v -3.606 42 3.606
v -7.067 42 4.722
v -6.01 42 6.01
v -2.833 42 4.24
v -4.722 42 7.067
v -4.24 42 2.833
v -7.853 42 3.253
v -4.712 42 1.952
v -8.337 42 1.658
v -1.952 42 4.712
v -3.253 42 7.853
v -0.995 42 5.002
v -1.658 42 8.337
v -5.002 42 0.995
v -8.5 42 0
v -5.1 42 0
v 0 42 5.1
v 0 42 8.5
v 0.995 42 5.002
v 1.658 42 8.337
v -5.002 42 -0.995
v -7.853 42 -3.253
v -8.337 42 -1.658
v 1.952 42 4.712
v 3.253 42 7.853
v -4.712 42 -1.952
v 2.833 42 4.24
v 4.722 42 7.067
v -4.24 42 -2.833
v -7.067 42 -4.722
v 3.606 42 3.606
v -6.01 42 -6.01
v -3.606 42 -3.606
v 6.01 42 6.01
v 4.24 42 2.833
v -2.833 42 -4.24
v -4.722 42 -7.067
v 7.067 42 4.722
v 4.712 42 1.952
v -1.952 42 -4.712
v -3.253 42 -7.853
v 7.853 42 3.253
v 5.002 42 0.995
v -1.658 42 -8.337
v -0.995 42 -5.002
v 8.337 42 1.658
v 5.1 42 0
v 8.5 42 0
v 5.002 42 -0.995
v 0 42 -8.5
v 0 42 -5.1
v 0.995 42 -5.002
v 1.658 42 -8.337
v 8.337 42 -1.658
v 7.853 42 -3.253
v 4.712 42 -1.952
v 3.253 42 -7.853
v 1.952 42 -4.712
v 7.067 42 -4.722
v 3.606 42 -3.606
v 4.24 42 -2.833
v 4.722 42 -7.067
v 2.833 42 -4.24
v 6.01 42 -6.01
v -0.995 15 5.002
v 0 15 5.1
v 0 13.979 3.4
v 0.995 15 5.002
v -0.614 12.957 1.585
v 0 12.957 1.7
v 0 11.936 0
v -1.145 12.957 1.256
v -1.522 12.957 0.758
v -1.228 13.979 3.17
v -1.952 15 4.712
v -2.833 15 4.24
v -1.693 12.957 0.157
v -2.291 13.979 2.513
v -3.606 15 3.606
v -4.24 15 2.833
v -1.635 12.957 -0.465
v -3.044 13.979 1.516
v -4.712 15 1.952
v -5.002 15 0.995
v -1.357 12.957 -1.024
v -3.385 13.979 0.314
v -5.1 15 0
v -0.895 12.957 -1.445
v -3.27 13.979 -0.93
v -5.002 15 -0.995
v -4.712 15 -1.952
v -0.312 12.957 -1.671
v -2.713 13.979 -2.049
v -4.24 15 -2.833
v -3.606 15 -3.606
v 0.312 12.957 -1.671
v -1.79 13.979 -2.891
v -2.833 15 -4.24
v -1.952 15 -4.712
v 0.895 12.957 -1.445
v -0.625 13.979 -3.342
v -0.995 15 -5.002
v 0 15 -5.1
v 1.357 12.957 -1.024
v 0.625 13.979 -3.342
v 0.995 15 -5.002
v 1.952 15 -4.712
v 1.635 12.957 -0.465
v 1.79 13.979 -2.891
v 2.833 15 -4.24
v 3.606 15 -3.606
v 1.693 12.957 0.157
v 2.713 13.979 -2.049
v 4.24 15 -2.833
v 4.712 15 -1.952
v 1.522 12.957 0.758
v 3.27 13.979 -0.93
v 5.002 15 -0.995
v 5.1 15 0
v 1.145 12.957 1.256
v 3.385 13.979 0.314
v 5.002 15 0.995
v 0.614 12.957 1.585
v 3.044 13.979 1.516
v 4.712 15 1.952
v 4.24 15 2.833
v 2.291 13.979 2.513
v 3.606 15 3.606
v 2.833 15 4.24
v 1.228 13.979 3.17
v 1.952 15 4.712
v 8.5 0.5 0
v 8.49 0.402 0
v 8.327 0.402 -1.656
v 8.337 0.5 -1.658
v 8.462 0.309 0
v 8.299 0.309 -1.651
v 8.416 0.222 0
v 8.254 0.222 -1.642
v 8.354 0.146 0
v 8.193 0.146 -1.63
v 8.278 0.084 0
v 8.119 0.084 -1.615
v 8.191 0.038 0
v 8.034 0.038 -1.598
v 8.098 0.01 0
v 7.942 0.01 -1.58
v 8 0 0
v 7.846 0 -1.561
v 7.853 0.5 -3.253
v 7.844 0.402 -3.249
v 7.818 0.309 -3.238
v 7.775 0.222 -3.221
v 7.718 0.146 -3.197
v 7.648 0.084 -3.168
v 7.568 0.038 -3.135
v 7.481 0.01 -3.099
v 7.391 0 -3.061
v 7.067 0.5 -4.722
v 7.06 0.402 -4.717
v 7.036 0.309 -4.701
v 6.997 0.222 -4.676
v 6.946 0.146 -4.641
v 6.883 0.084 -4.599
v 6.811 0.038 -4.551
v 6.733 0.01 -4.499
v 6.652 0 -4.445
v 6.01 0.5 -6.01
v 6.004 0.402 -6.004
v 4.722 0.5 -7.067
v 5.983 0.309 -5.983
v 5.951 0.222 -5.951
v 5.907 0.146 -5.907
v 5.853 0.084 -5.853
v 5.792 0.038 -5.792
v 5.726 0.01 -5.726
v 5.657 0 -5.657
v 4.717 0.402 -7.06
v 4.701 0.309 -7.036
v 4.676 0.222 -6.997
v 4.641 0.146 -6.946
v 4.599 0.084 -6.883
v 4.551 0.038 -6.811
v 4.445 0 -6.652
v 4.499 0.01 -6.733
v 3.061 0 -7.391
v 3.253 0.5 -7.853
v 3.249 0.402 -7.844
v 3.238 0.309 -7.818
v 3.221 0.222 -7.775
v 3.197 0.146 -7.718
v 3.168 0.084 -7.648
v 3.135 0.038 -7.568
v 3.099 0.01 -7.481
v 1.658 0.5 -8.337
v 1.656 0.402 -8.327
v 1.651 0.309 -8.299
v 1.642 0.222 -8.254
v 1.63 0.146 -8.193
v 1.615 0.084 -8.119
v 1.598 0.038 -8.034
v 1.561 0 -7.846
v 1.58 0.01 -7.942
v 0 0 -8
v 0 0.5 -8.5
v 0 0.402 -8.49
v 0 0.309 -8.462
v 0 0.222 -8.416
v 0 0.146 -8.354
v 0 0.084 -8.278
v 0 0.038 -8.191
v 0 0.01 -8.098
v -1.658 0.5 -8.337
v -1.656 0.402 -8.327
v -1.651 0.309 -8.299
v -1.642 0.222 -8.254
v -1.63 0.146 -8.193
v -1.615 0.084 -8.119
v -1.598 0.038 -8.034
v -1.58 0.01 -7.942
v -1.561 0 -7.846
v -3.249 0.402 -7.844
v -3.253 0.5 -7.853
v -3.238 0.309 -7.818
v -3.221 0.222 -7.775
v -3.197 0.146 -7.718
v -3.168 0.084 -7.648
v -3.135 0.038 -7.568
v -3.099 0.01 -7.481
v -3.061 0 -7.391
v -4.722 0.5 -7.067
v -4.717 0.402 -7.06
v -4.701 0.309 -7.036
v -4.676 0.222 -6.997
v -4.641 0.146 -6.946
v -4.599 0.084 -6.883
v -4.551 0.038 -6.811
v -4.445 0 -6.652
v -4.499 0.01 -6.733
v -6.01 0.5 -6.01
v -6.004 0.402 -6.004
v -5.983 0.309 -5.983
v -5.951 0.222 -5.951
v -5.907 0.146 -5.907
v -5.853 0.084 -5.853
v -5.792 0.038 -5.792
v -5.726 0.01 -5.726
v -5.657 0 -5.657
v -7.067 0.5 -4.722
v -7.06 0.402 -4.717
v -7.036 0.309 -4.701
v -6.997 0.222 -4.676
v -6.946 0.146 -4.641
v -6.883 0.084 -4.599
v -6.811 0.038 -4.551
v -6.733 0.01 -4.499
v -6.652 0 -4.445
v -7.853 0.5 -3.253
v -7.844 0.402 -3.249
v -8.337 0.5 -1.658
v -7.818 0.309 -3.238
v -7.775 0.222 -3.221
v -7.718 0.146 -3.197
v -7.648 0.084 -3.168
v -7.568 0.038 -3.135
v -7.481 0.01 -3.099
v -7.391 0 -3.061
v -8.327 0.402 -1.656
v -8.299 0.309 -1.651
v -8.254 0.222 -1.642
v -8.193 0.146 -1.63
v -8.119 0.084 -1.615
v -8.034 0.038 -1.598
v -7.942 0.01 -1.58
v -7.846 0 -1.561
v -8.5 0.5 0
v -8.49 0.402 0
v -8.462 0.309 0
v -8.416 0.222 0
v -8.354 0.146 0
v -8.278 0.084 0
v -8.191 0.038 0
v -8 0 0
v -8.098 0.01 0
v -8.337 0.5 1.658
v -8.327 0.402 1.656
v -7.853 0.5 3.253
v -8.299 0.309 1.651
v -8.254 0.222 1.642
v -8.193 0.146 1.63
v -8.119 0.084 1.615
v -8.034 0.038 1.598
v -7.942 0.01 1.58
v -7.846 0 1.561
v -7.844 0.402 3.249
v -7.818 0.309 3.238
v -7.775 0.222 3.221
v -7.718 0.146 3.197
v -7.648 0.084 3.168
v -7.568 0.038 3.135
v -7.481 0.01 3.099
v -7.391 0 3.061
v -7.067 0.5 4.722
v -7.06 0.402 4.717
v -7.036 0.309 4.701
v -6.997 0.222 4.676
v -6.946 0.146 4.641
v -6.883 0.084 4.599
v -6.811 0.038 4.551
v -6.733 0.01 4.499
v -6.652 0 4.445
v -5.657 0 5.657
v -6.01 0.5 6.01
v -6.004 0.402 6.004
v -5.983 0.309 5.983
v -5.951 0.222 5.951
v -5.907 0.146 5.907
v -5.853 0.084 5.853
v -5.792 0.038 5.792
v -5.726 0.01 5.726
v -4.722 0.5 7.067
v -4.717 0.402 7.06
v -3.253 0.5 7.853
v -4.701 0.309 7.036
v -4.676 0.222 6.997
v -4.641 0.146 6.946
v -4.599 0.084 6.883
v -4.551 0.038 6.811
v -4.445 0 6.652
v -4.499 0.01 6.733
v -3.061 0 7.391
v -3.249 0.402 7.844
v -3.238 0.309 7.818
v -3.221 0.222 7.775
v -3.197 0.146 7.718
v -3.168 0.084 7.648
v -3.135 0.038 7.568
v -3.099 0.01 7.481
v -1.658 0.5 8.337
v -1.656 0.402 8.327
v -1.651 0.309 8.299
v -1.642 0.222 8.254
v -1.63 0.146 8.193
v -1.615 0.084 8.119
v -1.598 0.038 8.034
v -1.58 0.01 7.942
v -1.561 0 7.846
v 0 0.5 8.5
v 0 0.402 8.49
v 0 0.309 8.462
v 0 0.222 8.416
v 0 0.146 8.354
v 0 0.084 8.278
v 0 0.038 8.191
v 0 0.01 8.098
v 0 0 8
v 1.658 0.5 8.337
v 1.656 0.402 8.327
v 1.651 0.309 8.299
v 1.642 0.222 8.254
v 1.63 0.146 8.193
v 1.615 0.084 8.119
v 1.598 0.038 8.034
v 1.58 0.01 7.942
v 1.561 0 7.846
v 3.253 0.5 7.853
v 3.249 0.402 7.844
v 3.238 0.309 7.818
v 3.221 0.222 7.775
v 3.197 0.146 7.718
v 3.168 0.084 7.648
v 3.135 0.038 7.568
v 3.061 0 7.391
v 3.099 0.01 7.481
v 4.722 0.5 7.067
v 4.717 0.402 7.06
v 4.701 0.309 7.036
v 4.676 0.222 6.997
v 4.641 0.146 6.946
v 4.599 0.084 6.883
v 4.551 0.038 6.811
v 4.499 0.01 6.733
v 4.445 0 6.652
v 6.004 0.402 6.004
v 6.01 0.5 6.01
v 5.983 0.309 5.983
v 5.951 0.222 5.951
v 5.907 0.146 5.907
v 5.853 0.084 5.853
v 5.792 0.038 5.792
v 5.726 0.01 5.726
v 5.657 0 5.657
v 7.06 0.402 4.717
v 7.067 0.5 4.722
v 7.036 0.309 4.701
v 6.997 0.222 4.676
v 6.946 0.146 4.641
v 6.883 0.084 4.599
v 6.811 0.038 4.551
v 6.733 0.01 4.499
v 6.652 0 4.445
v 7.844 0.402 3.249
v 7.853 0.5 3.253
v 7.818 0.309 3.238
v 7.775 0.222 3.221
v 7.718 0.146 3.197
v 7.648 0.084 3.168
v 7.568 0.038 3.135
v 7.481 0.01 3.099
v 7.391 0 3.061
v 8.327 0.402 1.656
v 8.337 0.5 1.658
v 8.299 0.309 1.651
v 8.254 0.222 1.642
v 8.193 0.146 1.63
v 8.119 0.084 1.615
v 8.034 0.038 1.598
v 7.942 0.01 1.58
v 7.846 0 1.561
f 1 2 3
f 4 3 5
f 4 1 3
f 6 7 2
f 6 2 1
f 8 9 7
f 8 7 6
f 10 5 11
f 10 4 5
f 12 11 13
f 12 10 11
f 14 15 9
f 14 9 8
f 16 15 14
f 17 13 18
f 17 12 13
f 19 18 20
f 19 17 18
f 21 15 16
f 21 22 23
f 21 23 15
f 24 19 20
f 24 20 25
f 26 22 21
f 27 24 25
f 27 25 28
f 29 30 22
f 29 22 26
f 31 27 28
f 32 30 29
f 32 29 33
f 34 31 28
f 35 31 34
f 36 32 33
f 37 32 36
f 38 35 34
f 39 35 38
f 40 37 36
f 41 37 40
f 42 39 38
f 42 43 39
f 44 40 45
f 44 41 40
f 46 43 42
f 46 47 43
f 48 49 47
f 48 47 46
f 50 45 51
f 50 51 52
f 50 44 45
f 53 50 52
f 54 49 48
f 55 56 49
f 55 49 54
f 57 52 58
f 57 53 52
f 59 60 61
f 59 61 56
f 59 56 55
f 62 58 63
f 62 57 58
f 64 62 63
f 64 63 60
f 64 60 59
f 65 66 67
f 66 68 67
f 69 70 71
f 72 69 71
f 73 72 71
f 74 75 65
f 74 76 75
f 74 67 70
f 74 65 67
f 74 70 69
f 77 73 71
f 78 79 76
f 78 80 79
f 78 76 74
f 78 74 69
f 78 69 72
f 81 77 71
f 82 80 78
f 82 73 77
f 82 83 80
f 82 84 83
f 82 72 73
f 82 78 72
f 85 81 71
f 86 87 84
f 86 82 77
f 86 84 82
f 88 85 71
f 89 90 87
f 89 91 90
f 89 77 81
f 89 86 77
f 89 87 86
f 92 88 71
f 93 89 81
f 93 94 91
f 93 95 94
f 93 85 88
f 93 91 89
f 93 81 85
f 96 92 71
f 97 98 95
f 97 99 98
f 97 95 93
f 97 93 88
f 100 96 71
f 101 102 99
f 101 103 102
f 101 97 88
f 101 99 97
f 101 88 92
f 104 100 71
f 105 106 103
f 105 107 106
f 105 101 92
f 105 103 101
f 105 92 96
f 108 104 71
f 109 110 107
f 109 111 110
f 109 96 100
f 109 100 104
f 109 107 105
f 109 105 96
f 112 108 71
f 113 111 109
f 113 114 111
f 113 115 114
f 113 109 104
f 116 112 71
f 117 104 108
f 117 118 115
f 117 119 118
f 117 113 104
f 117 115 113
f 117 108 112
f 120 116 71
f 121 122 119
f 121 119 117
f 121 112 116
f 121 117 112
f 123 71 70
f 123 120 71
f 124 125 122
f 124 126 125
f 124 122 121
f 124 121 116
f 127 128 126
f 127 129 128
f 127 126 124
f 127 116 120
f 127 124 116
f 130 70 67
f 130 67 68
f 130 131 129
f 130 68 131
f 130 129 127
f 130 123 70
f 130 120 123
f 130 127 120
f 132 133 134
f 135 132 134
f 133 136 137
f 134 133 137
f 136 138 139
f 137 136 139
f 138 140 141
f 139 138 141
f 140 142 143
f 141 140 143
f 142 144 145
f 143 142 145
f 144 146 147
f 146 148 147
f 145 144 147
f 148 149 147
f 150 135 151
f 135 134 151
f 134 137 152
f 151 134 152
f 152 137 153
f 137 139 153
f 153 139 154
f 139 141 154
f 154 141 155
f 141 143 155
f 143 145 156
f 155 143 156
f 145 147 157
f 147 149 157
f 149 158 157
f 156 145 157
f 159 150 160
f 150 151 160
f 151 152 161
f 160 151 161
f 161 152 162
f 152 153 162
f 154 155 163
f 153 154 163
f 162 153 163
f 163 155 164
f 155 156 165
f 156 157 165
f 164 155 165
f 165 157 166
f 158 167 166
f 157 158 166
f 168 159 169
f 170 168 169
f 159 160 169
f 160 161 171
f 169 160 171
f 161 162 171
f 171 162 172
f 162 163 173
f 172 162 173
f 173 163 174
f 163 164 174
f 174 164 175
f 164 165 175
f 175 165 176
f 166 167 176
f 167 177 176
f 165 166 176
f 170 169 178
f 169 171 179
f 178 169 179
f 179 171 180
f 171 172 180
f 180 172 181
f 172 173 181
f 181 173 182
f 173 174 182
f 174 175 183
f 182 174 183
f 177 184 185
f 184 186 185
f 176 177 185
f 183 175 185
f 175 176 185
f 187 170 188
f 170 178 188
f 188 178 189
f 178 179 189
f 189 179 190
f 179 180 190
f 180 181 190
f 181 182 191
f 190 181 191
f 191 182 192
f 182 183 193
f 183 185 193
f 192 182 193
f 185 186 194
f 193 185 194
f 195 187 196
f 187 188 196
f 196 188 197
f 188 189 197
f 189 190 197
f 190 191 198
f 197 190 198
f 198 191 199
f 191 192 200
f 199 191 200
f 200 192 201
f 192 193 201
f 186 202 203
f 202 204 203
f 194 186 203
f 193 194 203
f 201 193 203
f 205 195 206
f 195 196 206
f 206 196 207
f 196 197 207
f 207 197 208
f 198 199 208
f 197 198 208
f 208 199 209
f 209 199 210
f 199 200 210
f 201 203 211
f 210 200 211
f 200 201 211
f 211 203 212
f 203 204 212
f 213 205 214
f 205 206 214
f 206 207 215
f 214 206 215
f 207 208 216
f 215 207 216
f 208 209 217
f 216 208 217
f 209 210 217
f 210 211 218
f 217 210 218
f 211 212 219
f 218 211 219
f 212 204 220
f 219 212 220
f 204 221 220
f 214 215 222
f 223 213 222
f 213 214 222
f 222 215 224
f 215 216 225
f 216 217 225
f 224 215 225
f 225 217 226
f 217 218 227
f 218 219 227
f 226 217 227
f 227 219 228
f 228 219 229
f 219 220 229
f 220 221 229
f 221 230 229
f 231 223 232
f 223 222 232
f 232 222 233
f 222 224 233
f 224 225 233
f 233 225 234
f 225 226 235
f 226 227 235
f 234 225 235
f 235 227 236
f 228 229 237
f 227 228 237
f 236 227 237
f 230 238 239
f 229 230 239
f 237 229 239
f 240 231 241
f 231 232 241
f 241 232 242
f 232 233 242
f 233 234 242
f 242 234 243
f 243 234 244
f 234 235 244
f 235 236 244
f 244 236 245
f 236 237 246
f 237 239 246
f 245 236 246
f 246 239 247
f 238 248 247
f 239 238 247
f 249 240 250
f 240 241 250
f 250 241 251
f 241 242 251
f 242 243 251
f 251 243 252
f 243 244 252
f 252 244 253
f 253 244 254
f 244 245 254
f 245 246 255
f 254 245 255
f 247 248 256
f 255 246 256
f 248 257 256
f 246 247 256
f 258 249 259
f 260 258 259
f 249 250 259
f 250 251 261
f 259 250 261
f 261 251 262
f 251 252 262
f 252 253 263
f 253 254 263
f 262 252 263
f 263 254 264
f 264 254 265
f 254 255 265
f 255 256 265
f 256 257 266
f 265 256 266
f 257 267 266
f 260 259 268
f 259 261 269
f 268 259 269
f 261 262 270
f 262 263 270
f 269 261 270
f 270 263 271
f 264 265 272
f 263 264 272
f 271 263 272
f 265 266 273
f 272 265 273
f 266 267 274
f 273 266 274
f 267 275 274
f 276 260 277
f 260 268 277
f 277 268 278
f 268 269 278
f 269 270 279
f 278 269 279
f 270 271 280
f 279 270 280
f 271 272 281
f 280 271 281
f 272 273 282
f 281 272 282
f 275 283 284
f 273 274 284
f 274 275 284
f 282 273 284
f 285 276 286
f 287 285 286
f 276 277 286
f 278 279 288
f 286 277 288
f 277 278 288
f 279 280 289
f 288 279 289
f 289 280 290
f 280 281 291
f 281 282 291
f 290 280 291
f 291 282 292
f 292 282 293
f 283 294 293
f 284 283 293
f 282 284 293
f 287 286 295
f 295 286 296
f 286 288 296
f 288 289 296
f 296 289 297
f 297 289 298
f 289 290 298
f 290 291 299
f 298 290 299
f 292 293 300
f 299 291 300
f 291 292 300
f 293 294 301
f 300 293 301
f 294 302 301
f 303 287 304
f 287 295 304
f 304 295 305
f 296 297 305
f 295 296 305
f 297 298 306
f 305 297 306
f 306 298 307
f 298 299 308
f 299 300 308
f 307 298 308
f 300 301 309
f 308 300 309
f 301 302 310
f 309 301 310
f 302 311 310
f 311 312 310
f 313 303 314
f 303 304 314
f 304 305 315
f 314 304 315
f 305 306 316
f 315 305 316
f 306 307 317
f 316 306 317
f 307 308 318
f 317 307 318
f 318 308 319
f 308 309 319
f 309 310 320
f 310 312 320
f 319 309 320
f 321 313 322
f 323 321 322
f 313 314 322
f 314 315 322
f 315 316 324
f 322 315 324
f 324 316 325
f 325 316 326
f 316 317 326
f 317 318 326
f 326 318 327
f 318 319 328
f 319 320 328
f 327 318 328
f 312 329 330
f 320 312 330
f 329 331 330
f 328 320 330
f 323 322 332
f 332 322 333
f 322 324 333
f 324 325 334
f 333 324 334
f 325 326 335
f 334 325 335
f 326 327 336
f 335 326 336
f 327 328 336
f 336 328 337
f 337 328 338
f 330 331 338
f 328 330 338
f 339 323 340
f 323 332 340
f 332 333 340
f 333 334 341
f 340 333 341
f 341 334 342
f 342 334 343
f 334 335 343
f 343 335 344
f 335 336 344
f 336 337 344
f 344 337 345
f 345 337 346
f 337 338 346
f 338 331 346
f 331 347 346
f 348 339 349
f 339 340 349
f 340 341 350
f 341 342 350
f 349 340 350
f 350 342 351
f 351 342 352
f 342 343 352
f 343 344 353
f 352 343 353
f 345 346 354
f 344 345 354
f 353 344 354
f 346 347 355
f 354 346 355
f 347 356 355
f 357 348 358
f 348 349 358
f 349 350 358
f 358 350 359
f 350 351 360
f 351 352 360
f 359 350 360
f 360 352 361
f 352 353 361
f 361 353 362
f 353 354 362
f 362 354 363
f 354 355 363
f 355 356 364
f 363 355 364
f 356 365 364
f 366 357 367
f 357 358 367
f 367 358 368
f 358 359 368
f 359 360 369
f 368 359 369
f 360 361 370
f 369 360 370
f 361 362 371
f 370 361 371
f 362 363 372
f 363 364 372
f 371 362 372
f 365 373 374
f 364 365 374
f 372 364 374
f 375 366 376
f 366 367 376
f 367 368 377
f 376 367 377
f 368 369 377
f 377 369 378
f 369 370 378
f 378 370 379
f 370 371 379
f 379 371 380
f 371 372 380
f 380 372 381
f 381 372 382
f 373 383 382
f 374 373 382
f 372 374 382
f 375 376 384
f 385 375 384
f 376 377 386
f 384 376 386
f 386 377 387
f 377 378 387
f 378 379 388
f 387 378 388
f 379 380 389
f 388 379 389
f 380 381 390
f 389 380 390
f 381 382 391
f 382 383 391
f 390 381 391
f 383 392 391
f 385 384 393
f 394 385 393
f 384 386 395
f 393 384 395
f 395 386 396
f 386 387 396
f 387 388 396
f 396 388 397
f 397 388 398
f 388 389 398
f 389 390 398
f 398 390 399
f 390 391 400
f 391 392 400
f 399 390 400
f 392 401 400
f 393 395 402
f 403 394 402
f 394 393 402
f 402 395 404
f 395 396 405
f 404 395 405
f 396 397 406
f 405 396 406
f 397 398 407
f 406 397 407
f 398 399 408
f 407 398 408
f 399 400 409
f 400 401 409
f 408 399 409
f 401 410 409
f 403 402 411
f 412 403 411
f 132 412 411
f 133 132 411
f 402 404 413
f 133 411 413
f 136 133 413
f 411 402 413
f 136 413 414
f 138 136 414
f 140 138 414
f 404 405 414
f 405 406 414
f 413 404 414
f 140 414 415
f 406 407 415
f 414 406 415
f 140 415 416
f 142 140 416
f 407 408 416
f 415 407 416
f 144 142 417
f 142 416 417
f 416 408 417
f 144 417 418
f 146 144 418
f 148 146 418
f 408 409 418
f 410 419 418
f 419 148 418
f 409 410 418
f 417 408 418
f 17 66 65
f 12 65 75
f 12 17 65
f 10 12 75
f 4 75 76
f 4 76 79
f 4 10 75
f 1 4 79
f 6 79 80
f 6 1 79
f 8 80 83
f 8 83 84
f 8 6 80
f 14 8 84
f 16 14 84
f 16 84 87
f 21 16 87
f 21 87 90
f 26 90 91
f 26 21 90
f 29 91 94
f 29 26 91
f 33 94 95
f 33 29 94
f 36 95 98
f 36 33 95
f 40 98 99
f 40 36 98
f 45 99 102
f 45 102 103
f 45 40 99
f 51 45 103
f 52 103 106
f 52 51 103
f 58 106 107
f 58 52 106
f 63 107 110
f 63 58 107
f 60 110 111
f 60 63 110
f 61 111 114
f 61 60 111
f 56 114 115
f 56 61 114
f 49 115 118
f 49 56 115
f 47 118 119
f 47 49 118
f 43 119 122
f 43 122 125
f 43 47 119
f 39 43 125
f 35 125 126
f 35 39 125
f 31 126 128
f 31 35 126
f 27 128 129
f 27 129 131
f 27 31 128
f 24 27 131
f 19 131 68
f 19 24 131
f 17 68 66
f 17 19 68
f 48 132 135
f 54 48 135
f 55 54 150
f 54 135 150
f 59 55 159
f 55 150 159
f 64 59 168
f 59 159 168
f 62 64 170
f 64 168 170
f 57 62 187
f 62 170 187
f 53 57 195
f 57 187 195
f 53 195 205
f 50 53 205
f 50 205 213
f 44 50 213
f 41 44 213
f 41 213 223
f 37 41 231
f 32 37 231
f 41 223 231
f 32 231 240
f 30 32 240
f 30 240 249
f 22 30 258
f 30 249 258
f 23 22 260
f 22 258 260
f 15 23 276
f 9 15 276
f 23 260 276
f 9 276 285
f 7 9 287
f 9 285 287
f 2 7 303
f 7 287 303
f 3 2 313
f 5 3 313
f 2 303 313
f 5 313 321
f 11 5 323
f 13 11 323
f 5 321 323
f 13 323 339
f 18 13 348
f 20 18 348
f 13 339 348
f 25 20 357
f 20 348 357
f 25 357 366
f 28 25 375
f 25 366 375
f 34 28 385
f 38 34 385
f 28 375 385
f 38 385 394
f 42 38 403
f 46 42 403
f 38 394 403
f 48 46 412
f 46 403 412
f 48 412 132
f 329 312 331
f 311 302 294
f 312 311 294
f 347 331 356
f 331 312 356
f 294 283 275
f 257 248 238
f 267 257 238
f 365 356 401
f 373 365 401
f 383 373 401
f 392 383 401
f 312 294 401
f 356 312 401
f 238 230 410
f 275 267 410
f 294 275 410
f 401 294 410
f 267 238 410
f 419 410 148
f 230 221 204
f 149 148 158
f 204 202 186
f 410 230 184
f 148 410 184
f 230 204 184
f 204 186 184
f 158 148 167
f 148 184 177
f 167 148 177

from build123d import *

# Parameters (mm, degrees)
SKETCH1_R           = 8.5
BOSS_EXTRUDE1_DEPTH = 42
FILLET1_R           = 0.5


with BuildPart() as part:
    # Sketch1 → Boss-Extrude1 (new body)
    with BuildSketch(Plane(origin=(0, 0, 0), x_dir=(1, 0, 0), z_dir=(0, 1, 0))):
        Circle(SKETCH1_R)
    extrude(amount=BOSS_EXTRUDE1_DEPTH)

    # Sketch2 → M12 Tapped Hole1 (revolve, cut)
    with BuildSketch(Plane(origin=(0, 42, 0), x_dir=(0, 0, 1), z_dir=(1, 0, 0))):
        Polygon((0, 0), (0, 30.064389157), (5.1, 27), (5.1, 0), align=None)
    revolve(axis=Axis((0, 48.35, 0), (0, -1, 0)), mode=Mode.SUBTRACT)

    # Fillet1
    fillet1_edges = [part.edges().sort_by_distance(p)[0] for p in [
        (-8.5, 0, 0),
    ]]
    fillet(fillet1_edges, radius=FILLET1_R)


solid = part.part
